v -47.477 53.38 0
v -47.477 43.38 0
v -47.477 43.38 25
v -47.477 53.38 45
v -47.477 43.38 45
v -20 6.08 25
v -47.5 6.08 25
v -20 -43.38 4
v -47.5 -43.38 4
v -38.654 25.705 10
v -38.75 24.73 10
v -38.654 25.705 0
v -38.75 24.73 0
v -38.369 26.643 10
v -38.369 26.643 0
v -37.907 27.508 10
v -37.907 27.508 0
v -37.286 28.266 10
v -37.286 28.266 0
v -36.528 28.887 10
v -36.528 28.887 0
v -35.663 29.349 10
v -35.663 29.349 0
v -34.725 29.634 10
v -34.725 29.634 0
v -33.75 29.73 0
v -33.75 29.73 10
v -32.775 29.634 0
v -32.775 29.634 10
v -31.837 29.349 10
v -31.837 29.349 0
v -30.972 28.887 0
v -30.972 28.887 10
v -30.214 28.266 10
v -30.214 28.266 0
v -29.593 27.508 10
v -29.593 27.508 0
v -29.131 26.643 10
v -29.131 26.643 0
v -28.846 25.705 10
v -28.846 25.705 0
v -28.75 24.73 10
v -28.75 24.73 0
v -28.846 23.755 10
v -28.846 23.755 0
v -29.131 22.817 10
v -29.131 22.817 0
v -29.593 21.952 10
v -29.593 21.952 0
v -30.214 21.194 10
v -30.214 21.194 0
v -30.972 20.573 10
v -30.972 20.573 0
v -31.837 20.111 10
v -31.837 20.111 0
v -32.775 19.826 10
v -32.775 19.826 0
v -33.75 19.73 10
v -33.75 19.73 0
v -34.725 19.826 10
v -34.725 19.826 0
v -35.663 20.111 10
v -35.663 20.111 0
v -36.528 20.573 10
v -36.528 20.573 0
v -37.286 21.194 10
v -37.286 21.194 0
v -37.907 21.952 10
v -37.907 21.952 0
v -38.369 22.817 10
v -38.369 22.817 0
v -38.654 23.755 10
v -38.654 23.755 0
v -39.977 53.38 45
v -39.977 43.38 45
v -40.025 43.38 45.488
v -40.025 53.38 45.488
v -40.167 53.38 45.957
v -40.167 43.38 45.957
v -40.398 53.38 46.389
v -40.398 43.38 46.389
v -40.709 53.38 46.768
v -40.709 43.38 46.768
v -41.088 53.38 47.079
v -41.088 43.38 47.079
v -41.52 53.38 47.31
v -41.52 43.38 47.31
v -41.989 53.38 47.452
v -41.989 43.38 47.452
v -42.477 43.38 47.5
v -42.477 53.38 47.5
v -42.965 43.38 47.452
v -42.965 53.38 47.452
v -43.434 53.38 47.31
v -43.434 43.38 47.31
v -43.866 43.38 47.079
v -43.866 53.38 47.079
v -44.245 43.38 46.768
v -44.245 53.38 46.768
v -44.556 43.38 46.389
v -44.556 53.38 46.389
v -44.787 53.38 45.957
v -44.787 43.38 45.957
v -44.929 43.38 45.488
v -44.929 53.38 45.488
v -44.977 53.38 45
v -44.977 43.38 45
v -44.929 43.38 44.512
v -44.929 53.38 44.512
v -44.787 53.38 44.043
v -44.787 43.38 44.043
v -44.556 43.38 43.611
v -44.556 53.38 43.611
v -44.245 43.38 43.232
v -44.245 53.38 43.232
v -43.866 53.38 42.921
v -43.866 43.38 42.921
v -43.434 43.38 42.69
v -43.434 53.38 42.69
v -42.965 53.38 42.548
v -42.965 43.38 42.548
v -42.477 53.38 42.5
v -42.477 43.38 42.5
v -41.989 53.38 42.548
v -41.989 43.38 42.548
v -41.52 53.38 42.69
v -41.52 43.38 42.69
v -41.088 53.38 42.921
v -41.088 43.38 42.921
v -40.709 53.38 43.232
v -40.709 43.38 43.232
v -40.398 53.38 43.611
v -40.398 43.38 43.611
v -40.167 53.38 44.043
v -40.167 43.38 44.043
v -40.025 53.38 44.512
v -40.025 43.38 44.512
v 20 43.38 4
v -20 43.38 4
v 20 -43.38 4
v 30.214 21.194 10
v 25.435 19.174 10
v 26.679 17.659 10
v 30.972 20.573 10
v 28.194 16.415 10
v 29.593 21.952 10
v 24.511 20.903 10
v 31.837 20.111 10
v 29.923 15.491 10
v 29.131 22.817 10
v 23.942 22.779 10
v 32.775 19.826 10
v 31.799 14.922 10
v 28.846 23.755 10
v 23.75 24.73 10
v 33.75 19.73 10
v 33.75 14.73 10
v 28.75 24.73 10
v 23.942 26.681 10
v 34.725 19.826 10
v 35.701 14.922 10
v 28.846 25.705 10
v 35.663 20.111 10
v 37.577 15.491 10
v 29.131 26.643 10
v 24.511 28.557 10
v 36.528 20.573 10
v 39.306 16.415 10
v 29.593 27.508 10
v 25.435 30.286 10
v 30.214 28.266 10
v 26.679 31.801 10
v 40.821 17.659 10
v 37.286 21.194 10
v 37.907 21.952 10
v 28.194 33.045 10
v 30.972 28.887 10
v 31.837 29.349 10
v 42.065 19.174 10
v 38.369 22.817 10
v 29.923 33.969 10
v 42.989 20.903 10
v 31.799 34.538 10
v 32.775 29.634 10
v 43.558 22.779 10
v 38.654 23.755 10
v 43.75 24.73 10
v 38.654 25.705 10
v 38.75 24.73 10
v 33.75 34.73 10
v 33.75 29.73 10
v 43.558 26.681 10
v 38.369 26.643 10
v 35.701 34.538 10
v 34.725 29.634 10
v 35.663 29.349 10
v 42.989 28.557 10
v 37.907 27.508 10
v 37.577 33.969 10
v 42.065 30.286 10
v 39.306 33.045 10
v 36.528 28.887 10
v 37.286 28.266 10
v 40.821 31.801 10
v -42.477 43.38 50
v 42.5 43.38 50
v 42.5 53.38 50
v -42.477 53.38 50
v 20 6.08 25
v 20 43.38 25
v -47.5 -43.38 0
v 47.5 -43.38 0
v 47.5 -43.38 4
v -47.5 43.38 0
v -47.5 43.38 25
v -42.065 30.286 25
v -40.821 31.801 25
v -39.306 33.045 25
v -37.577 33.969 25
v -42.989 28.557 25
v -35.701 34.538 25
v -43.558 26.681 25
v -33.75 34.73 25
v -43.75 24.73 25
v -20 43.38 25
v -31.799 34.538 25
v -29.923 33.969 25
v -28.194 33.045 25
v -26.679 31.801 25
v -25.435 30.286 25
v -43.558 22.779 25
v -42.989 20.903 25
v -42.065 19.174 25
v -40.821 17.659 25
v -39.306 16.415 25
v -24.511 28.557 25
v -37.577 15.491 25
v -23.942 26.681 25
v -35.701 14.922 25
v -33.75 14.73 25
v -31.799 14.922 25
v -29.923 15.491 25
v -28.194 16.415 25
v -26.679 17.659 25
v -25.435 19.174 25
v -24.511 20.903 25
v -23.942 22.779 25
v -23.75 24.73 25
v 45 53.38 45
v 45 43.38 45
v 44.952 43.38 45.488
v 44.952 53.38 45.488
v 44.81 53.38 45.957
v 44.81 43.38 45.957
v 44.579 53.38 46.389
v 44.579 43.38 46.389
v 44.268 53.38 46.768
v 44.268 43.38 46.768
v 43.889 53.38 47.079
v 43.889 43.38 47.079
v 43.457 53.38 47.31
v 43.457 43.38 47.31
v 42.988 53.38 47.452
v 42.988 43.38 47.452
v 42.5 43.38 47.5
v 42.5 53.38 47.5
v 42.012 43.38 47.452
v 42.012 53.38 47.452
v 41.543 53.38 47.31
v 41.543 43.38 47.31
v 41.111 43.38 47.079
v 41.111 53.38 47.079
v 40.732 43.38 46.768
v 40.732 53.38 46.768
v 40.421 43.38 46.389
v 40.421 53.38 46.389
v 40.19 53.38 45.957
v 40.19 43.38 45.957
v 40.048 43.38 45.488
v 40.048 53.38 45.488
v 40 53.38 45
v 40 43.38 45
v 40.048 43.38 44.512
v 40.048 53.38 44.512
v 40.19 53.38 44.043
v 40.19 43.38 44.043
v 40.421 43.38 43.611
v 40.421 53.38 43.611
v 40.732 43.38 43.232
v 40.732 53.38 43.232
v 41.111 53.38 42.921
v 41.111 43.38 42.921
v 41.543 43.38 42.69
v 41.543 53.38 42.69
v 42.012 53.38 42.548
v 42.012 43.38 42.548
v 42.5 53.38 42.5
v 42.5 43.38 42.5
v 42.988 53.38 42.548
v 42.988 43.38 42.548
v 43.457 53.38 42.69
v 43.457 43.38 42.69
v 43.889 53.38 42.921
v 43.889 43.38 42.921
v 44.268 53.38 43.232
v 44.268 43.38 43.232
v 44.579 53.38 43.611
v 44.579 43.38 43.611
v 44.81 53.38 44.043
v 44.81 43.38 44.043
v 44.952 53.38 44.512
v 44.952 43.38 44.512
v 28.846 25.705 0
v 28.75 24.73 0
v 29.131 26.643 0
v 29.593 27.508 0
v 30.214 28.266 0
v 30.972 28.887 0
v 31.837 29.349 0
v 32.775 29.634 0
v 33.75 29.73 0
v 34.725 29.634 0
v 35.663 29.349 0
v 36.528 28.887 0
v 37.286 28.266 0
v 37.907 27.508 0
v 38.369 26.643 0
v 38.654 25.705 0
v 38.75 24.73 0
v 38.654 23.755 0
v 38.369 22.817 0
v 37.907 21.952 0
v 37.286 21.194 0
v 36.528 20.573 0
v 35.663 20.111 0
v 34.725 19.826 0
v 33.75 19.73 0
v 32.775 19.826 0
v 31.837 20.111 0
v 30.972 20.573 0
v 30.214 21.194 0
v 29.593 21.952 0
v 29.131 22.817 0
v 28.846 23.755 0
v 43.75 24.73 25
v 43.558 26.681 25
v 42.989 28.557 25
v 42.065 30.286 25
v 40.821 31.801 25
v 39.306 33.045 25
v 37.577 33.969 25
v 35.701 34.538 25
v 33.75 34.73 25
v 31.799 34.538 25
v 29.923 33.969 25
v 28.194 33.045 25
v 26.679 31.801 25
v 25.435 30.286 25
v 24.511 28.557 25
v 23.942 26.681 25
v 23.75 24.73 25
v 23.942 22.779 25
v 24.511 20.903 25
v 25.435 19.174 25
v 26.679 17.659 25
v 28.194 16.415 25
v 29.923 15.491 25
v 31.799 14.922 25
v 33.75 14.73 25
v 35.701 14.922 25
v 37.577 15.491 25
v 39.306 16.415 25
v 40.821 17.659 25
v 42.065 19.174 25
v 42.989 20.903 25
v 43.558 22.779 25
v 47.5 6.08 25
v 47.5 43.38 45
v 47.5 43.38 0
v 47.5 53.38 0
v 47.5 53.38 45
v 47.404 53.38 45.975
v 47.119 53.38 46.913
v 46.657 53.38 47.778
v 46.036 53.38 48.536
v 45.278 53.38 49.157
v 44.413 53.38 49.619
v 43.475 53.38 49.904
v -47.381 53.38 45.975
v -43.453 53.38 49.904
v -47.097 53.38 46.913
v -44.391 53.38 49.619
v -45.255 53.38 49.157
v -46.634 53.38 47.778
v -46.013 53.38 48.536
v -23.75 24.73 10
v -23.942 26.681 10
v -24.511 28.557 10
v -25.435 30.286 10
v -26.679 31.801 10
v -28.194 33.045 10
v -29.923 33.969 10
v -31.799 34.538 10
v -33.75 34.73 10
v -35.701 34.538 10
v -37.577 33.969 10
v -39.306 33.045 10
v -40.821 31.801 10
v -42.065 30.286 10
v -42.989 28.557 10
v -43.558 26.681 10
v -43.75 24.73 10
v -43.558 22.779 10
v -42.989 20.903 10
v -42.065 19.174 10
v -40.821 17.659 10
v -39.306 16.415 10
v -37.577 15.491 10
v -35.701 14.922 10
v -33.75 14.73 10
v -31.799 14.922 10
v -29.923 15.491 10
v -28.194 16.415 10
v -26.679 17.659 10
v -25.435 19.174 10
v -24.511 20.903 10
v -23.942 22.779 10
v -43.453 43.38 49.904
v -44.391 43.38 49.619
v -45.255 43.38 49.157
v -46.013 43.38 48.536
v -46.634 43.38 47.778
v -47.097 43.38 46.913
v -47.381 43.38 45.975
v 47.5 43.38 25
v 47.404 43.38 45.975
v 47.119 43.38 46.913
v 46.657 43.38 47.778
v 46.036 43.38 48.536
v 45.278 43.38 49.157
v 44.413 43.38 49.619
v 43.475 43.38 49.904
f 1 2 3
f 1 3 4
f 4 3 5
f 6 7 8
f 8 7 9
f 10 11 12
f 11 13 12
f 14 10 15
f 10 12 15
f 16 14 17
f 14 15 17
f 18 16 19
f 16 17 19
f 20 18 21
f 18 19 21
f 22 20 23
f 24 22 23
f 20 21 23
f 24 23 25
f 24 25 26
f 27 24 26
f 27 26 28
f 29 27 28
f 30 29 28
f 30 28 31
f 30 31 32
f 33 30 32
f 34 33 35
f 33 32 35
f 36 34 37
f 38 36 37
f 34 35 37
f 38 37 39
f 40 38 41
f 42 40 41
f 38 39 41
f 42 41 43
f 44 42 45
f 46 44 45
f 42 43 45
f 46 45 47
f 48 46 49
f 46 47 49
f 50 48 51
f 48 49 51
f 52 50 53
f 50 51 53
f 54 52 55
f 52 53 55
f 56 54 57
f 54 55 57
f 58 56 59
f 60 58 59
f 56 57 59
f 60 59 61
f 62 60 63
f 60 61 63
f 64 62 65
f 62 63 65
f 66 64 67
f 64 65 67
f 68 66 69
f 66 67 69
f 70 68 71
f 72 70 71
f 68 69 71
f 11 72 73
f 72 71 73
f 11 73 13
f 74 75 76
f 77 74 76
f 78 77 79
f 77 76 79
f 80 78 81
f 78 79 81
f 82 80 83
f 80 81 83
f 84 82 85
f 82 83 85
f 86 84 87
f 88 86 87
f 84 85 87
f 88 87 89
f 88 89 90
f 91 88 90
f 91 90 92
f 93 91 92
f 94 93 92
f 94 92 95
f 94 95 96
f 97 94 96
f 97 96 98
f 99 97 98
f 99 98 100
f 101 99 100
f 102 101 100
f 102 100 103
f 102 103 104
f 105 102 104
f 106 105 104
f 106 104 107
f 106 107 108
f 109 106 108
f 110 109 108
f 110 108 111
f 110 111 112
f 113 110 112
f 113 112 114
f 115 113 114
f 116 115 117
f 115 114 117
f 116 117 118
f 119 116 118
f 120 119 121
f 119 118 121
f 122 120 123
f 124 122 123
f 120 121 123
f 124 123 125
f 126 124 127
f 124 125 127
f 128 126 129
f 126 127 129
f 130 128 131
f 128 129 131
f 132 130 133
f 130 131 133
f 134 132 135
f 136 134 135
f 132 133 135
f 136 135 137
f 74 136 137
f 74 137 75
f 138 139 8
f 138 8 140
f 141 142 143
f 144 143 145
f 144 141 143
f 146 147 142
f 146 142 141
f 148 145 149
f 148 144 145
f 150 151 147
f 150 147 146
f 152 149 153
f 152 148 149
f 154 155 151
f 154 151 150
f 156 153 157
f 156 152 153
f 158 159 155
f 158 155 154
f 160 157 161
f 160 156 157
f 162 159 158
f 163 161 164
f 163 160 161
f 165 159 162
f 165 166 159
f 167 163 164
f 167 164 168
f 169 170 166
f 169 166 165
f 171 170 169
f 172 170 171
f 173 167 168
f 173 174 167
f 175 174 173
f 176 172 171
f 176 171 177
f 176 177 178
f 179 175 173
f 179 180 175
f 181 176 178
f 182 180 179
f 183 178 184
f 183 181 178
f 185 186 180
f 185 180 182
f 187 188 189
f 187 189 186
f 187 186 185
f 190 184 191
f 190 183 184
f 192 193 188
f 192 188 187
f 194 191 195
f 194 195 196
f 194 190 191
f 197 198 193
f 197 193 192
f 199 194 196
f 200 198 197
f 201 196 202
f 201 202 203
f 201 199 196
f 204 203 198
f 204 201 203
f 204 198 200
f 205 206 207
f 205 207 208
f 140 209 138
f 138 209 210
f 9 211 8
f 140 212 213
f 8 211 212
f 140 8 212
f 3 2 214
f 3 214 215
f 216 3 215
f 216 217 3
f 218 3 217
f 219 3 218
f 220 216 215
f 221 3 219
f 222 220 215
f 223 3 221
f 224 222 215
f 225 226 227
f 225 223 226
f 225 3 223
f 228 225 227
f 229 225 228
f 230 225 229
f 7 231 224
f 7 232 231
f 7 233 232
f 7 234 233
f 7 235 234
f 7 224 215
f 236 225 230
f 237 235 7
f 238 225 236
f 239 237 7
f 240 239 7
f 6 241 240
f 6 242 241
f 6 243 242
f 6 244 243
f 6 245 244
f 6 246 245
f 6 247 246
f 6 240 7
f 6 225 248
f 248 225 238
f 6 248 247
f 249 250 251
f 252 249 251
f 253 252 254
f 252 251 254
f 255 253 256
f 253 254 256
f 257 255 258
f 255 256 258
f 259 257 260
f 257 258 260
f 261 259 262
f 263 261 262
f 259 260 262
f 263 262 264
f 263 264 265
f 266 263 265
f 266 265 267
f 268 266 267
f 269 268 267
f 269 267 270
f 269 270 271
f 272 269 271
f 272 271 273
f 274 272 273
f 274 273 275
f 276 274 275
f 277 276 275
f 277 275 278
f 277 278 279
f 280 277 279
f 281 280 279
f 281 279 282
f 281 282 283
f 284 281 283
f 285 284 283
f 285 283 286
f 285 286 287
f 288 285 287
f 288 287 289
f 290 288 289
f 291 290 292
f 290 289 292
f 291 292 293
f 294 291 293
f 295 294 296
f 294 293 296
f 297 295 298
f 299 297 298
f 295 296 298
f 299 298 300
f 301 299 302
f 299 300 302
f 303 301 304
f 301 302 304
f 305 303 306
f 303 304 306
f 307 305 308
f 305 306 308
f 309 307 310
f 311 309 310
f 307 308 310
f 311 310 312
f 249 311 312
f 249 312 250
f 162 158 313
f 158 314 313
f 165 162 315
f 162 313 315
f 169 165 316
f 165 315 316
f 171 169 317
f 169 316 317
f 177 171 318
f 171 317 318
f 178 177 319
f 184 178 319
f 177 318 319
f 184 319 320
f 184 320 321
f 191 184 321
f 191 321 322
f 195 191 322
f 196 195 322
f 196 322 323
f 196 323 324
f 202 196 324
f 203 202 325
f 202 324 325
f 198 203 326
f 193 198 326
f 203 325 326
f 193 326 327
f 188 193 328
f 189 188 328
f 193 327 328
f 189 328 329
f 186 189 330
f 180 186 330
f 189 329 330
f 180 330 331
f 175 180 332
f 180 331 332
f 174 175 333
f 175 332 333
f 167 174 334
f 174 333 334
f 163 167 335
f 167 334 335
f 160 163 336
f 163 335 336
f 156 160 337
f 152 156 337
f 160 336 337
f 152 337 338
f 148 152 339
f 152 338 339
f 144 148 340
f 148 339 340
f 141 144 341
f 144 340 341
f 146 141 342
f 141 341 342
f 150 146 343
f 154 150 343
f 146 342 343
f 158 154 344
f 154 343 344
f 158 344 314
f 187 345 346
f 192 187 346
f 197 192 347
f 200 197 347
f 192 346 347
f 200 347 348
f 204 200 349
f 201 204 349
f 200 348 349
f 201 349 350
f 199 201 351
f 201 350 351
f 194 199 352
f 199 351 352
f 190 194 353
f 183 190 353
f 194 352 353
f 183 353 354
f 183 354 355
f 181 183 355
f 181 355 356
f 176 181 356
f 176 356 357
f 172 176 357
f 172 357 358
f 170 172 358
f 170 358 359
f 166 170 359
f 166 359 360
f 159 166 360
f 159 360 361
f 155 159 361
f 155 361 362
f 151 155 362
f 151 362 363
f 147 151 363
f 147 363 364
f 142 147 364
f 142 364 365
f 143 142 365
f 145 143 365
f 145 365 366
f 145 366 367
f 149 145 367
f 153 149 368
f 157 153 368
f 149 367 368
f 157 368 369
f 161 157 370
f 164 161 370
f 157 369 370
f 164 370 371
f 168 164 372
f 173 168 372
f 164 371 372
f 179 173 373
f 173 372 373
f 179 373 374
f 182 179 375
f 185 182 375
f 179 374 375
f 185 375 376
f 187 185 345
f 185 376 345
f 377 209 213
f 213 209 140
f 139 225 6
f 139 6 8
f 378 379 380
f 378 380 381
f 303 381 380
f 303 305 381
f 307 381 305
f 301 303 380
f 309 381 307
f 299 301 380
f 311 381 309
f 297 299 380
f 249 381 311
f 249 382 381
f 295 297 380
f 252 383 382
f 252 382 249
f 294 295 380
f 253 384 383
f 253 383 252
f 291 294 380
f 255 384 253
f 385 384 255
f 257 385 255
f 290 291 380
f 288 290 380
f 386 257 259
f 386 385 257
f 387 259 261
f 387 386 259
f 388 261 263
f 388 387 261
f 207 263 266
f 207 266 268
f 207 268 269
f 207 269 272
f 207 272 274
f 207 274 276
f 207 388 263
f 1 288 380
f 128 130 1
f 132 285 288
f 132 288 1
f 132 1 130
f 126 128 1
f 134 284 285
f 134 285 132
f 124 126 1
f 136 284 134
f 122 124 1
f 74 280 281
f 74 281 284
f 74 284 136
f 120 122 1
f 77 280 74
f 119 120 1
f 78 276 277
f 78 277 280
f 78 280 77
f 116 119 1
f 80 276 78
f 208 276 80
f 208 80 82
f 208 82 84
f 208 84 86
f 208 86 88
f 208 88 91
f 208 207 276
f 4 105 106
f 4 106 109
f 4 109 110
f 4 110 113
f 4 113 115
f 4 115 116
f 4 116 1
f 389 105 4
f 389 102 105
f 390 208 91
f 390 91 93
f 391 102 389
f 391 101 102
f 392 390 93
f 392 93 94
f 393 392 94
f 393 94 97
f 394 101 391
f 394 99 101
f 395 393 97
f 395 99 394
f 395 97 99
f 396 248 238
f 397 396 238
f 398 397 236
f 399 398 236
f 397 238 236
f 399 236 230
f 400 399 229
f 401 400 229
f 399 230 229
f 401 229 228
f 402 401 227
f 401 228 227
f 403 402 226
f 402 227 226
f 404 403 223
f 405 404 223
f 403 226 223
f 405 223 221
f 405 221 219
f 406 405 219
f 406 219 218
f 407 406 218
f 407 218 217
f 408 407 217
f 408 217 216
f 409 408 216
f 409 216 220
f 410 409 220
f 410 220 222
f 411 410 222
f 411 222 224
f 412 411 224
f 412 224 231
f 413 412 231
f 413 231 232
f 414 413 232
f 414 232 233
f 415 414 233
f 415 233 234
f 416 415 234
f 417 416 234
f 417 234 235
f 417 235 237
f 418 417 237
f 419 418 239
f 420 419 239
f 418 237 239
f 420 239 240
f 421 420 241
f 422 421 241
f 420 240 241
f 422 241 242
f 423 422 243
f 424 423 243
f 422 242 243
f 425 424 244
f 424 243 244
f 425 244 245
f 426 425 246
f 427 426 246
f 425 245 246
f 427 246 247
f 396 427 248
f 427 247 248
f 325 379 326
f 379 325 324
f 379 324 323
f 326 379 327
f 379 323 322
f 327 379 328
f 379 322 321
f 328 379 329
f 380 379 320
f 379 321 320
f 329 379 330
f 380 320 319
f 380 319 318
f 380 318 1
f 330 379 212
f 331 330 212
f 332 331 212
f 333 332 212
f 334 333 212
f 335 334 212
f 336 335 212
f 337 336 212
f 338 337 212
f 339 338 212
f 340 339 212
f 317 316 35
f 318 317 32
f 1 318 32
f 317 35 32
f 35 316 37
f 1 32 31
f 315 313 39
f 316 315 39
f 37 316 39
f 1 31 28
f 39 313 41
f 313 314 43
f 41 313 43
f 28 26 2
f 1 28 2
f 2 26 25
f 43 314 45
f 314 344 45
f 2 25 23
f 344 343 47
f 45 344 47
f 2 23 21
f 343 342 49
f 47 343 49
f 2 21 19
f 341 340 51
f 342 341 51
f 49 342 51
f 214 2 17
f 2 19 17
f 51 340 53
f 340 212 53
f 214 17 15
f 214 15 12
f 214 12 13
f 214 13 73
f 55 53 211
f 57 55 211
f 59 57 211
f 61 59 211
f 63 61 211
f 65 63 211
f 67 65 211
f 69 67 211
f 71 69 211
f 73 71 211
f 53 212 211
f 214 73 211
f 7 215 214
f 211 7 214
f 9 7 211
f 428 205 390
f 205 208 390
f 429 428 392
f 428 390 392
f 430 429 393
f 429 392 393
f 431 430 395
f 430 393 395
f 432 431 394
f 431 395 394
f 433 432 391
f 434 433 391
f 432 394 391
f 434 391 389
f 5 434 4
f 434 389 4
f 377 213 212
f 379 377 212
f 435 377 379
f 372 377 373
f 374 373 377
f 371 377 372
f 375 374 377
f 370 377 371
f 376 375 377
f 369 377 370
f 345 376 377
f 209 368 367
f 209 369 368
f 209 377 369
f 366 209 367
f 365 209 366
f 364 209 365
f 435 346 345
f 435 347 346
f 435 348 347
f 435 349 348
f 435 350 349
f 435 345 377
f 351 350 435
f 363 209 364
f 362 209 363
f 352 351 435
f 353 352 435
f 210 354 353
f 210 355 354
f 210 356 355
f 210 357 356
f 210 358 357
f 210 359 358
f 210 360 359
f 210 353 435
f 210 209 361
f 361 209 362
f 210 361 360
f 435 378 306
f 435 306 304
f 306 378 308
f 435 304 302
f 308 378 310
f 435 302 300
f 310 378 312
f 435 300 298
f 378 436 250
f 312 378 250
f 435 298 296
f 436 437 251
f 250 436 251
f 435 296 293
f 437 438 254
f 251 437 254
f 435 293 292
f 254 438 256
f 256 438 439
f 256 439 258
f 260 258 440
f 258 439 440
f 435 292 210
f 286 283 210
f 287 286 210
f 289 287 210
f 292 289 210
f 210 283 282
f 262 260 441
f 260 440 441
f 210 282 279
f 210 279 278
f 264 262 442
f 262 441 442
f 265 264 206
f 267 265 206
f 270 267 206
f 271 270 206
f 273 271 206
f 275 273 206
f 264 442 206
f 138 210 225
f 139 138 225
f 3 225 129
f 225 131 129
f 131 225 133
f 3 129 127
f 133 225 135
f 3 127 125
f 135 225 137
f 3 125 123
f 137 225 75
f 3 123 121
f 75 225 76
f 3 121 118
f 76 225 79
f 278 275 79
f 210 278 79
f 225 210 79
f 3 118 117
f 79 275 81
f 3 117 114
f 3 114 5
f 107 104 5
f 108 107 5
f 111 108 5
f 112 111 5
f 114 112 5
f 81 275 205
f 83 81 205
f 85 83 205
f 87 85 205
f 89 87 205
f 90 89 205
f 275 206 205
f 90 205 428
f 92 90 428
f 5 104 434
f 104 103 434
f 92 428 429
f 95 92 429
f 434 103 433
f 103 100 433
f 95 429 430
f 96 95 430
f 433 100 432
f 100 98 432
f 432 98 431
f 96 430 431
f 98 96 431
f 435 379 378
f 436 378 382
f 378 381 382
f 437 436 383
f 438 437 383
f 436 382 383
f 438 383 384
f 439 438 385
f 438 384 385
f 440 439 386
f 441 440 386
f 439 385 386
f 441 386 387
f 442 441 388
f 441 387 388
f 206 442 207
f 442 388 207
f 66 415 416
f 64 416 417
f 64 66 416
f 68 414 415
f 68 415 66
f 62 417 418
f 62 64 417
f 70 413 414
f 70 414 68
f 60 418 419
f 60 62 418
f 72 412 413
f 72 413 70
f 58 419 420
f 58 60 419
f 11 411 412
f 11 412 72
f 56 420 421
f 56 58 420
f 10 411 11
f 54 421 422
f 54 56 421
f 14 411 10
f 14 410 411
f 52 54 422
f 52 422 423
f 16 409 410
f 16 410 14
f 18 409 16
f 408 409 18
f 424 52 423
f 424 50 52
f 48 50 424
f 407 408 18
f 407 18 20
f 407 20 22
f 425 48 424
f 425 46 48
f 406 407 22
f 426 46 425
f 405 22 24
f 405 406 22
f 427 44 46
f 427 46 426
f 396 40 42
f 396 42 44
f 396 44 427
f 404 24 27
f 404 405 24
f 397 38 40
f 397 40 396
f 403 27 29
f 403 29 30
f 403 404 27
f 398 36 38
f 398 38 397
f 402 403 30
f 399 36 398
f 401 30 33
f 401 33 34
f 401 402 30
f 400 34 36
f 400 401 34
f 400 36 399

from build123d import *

# Parameters (mm, degrees)
F0_W            = 40
F0_H            = 86.76
F1_DEPTH        = 4
F2_W            = 95
F2_H            = 25
F3_DEPTH        = 27.5
F4_W            = 86.76
F4_H            = 25
F5_DEPTH        = 27.5
F6_W            = 94.977141
F6_H            = 50
F7_DEPTH        = 10
F9_R            = 5
F10_R           = 5
F11_R           = 2.5
F12_DEPTH       = 10.001
F14_DEPTH       = 95.001
F16_D           = 10
F16_CBORE_D     = 20
F16_CBORE_DEPTH = 15
F17_D           = 10
F17_CBORE_D     = 20
F17_CBORE_DEPTH = 15


with BuildPart() as f1:
    # F0 (on Top) → F1 (new body)
    with BuildSketch(Plane.XY):
        Rectangle(F0_W, F0_H)
    extrude(amount=F1_DEPTH)

    # F2 (on face) → F3 (join)
    with BuildSketch(Plane.YZ.offset(20)):
        with Locations((4.12, 12.5)):
            Rectangle(F2_W, F2_H)
    extrude(amount=F3_DEPTH)

    # F4 (on face) → F5 (join)
    with BuildSketch(Plane(origin=(-20, 0, 0), x_dir=(0, -1, 0), z_dir=(-1, 0, 0))):
        with Locations((0, 12.5)):
            Rectangle(F4_W, F4_H)
    extrude(amount=F5_DEPTH)

    # F6 (on face) → F7 (join)
    with BuildSketch(Plane(origin=(0, 43.38, 0), x_dir=(-1, 0, 0), z_dir=(0, 1, 0))):
        with Locations((-0.01143, 25)):
            Rectangle(F6_W, F6_H)
    extrude(amount=F7_DEPTH)

    # F9
    f9_edges = [f1.edges().sort_by_distance(p)[0] for p in [
        (47.5, 48.38, 50),
    ]]
    fillet(f9_edges, radius=F9_R)

    # F10
    f10_edges = [f1.edges().sort_by_distance(p)[0] for p in [
        (-47.477141, 48.38, 50),
    ]]
    fillet(f10_edges, radius=F10_R)

    # F11 (on face) → F12 (cut, through all)
    with BuildSketch(Plane.XZ.offset(-43.38)):
        with Locations((-42.477141, 45)):
            Circle(F11_R)
        with Locations((42.5, 45)):
            Circle(F11_R)
    extrude(amount=-F12_DEPTH, mode=Mode.SUBTRACT)

    # F13 (on face) → F14 (cut, through all)
    with BuildSketch(Plane(origin=(-47.5, 0, 0), x_dir=(0, -1, 0), z_dir=(-1, 0, 0))):
        Polygon((43.38, 25), (-6.08, 25), (43.38, 4), align=None)
    extrude(amount=-F14_DEPTH, mode=Mode.SUBTRACT)

    # F16 (through all)
    with Locations(Plane.XY.offset(25)):
        with Locations((-33.75, 24.73)):
            CounterBoreHole(F16_D / 2, F16_CBORE_D / 2, F16_CBORE_DEPTH)

    # F17 (through all)
    with Locations(Plane.XY.offset(25)):
        with Locations((33.75, 24.73)):
            CounterBoreHole(F17_D / 2, F17_CBORE_D / 2, F17_CBORE_DEPTH)


solid = f1.part
